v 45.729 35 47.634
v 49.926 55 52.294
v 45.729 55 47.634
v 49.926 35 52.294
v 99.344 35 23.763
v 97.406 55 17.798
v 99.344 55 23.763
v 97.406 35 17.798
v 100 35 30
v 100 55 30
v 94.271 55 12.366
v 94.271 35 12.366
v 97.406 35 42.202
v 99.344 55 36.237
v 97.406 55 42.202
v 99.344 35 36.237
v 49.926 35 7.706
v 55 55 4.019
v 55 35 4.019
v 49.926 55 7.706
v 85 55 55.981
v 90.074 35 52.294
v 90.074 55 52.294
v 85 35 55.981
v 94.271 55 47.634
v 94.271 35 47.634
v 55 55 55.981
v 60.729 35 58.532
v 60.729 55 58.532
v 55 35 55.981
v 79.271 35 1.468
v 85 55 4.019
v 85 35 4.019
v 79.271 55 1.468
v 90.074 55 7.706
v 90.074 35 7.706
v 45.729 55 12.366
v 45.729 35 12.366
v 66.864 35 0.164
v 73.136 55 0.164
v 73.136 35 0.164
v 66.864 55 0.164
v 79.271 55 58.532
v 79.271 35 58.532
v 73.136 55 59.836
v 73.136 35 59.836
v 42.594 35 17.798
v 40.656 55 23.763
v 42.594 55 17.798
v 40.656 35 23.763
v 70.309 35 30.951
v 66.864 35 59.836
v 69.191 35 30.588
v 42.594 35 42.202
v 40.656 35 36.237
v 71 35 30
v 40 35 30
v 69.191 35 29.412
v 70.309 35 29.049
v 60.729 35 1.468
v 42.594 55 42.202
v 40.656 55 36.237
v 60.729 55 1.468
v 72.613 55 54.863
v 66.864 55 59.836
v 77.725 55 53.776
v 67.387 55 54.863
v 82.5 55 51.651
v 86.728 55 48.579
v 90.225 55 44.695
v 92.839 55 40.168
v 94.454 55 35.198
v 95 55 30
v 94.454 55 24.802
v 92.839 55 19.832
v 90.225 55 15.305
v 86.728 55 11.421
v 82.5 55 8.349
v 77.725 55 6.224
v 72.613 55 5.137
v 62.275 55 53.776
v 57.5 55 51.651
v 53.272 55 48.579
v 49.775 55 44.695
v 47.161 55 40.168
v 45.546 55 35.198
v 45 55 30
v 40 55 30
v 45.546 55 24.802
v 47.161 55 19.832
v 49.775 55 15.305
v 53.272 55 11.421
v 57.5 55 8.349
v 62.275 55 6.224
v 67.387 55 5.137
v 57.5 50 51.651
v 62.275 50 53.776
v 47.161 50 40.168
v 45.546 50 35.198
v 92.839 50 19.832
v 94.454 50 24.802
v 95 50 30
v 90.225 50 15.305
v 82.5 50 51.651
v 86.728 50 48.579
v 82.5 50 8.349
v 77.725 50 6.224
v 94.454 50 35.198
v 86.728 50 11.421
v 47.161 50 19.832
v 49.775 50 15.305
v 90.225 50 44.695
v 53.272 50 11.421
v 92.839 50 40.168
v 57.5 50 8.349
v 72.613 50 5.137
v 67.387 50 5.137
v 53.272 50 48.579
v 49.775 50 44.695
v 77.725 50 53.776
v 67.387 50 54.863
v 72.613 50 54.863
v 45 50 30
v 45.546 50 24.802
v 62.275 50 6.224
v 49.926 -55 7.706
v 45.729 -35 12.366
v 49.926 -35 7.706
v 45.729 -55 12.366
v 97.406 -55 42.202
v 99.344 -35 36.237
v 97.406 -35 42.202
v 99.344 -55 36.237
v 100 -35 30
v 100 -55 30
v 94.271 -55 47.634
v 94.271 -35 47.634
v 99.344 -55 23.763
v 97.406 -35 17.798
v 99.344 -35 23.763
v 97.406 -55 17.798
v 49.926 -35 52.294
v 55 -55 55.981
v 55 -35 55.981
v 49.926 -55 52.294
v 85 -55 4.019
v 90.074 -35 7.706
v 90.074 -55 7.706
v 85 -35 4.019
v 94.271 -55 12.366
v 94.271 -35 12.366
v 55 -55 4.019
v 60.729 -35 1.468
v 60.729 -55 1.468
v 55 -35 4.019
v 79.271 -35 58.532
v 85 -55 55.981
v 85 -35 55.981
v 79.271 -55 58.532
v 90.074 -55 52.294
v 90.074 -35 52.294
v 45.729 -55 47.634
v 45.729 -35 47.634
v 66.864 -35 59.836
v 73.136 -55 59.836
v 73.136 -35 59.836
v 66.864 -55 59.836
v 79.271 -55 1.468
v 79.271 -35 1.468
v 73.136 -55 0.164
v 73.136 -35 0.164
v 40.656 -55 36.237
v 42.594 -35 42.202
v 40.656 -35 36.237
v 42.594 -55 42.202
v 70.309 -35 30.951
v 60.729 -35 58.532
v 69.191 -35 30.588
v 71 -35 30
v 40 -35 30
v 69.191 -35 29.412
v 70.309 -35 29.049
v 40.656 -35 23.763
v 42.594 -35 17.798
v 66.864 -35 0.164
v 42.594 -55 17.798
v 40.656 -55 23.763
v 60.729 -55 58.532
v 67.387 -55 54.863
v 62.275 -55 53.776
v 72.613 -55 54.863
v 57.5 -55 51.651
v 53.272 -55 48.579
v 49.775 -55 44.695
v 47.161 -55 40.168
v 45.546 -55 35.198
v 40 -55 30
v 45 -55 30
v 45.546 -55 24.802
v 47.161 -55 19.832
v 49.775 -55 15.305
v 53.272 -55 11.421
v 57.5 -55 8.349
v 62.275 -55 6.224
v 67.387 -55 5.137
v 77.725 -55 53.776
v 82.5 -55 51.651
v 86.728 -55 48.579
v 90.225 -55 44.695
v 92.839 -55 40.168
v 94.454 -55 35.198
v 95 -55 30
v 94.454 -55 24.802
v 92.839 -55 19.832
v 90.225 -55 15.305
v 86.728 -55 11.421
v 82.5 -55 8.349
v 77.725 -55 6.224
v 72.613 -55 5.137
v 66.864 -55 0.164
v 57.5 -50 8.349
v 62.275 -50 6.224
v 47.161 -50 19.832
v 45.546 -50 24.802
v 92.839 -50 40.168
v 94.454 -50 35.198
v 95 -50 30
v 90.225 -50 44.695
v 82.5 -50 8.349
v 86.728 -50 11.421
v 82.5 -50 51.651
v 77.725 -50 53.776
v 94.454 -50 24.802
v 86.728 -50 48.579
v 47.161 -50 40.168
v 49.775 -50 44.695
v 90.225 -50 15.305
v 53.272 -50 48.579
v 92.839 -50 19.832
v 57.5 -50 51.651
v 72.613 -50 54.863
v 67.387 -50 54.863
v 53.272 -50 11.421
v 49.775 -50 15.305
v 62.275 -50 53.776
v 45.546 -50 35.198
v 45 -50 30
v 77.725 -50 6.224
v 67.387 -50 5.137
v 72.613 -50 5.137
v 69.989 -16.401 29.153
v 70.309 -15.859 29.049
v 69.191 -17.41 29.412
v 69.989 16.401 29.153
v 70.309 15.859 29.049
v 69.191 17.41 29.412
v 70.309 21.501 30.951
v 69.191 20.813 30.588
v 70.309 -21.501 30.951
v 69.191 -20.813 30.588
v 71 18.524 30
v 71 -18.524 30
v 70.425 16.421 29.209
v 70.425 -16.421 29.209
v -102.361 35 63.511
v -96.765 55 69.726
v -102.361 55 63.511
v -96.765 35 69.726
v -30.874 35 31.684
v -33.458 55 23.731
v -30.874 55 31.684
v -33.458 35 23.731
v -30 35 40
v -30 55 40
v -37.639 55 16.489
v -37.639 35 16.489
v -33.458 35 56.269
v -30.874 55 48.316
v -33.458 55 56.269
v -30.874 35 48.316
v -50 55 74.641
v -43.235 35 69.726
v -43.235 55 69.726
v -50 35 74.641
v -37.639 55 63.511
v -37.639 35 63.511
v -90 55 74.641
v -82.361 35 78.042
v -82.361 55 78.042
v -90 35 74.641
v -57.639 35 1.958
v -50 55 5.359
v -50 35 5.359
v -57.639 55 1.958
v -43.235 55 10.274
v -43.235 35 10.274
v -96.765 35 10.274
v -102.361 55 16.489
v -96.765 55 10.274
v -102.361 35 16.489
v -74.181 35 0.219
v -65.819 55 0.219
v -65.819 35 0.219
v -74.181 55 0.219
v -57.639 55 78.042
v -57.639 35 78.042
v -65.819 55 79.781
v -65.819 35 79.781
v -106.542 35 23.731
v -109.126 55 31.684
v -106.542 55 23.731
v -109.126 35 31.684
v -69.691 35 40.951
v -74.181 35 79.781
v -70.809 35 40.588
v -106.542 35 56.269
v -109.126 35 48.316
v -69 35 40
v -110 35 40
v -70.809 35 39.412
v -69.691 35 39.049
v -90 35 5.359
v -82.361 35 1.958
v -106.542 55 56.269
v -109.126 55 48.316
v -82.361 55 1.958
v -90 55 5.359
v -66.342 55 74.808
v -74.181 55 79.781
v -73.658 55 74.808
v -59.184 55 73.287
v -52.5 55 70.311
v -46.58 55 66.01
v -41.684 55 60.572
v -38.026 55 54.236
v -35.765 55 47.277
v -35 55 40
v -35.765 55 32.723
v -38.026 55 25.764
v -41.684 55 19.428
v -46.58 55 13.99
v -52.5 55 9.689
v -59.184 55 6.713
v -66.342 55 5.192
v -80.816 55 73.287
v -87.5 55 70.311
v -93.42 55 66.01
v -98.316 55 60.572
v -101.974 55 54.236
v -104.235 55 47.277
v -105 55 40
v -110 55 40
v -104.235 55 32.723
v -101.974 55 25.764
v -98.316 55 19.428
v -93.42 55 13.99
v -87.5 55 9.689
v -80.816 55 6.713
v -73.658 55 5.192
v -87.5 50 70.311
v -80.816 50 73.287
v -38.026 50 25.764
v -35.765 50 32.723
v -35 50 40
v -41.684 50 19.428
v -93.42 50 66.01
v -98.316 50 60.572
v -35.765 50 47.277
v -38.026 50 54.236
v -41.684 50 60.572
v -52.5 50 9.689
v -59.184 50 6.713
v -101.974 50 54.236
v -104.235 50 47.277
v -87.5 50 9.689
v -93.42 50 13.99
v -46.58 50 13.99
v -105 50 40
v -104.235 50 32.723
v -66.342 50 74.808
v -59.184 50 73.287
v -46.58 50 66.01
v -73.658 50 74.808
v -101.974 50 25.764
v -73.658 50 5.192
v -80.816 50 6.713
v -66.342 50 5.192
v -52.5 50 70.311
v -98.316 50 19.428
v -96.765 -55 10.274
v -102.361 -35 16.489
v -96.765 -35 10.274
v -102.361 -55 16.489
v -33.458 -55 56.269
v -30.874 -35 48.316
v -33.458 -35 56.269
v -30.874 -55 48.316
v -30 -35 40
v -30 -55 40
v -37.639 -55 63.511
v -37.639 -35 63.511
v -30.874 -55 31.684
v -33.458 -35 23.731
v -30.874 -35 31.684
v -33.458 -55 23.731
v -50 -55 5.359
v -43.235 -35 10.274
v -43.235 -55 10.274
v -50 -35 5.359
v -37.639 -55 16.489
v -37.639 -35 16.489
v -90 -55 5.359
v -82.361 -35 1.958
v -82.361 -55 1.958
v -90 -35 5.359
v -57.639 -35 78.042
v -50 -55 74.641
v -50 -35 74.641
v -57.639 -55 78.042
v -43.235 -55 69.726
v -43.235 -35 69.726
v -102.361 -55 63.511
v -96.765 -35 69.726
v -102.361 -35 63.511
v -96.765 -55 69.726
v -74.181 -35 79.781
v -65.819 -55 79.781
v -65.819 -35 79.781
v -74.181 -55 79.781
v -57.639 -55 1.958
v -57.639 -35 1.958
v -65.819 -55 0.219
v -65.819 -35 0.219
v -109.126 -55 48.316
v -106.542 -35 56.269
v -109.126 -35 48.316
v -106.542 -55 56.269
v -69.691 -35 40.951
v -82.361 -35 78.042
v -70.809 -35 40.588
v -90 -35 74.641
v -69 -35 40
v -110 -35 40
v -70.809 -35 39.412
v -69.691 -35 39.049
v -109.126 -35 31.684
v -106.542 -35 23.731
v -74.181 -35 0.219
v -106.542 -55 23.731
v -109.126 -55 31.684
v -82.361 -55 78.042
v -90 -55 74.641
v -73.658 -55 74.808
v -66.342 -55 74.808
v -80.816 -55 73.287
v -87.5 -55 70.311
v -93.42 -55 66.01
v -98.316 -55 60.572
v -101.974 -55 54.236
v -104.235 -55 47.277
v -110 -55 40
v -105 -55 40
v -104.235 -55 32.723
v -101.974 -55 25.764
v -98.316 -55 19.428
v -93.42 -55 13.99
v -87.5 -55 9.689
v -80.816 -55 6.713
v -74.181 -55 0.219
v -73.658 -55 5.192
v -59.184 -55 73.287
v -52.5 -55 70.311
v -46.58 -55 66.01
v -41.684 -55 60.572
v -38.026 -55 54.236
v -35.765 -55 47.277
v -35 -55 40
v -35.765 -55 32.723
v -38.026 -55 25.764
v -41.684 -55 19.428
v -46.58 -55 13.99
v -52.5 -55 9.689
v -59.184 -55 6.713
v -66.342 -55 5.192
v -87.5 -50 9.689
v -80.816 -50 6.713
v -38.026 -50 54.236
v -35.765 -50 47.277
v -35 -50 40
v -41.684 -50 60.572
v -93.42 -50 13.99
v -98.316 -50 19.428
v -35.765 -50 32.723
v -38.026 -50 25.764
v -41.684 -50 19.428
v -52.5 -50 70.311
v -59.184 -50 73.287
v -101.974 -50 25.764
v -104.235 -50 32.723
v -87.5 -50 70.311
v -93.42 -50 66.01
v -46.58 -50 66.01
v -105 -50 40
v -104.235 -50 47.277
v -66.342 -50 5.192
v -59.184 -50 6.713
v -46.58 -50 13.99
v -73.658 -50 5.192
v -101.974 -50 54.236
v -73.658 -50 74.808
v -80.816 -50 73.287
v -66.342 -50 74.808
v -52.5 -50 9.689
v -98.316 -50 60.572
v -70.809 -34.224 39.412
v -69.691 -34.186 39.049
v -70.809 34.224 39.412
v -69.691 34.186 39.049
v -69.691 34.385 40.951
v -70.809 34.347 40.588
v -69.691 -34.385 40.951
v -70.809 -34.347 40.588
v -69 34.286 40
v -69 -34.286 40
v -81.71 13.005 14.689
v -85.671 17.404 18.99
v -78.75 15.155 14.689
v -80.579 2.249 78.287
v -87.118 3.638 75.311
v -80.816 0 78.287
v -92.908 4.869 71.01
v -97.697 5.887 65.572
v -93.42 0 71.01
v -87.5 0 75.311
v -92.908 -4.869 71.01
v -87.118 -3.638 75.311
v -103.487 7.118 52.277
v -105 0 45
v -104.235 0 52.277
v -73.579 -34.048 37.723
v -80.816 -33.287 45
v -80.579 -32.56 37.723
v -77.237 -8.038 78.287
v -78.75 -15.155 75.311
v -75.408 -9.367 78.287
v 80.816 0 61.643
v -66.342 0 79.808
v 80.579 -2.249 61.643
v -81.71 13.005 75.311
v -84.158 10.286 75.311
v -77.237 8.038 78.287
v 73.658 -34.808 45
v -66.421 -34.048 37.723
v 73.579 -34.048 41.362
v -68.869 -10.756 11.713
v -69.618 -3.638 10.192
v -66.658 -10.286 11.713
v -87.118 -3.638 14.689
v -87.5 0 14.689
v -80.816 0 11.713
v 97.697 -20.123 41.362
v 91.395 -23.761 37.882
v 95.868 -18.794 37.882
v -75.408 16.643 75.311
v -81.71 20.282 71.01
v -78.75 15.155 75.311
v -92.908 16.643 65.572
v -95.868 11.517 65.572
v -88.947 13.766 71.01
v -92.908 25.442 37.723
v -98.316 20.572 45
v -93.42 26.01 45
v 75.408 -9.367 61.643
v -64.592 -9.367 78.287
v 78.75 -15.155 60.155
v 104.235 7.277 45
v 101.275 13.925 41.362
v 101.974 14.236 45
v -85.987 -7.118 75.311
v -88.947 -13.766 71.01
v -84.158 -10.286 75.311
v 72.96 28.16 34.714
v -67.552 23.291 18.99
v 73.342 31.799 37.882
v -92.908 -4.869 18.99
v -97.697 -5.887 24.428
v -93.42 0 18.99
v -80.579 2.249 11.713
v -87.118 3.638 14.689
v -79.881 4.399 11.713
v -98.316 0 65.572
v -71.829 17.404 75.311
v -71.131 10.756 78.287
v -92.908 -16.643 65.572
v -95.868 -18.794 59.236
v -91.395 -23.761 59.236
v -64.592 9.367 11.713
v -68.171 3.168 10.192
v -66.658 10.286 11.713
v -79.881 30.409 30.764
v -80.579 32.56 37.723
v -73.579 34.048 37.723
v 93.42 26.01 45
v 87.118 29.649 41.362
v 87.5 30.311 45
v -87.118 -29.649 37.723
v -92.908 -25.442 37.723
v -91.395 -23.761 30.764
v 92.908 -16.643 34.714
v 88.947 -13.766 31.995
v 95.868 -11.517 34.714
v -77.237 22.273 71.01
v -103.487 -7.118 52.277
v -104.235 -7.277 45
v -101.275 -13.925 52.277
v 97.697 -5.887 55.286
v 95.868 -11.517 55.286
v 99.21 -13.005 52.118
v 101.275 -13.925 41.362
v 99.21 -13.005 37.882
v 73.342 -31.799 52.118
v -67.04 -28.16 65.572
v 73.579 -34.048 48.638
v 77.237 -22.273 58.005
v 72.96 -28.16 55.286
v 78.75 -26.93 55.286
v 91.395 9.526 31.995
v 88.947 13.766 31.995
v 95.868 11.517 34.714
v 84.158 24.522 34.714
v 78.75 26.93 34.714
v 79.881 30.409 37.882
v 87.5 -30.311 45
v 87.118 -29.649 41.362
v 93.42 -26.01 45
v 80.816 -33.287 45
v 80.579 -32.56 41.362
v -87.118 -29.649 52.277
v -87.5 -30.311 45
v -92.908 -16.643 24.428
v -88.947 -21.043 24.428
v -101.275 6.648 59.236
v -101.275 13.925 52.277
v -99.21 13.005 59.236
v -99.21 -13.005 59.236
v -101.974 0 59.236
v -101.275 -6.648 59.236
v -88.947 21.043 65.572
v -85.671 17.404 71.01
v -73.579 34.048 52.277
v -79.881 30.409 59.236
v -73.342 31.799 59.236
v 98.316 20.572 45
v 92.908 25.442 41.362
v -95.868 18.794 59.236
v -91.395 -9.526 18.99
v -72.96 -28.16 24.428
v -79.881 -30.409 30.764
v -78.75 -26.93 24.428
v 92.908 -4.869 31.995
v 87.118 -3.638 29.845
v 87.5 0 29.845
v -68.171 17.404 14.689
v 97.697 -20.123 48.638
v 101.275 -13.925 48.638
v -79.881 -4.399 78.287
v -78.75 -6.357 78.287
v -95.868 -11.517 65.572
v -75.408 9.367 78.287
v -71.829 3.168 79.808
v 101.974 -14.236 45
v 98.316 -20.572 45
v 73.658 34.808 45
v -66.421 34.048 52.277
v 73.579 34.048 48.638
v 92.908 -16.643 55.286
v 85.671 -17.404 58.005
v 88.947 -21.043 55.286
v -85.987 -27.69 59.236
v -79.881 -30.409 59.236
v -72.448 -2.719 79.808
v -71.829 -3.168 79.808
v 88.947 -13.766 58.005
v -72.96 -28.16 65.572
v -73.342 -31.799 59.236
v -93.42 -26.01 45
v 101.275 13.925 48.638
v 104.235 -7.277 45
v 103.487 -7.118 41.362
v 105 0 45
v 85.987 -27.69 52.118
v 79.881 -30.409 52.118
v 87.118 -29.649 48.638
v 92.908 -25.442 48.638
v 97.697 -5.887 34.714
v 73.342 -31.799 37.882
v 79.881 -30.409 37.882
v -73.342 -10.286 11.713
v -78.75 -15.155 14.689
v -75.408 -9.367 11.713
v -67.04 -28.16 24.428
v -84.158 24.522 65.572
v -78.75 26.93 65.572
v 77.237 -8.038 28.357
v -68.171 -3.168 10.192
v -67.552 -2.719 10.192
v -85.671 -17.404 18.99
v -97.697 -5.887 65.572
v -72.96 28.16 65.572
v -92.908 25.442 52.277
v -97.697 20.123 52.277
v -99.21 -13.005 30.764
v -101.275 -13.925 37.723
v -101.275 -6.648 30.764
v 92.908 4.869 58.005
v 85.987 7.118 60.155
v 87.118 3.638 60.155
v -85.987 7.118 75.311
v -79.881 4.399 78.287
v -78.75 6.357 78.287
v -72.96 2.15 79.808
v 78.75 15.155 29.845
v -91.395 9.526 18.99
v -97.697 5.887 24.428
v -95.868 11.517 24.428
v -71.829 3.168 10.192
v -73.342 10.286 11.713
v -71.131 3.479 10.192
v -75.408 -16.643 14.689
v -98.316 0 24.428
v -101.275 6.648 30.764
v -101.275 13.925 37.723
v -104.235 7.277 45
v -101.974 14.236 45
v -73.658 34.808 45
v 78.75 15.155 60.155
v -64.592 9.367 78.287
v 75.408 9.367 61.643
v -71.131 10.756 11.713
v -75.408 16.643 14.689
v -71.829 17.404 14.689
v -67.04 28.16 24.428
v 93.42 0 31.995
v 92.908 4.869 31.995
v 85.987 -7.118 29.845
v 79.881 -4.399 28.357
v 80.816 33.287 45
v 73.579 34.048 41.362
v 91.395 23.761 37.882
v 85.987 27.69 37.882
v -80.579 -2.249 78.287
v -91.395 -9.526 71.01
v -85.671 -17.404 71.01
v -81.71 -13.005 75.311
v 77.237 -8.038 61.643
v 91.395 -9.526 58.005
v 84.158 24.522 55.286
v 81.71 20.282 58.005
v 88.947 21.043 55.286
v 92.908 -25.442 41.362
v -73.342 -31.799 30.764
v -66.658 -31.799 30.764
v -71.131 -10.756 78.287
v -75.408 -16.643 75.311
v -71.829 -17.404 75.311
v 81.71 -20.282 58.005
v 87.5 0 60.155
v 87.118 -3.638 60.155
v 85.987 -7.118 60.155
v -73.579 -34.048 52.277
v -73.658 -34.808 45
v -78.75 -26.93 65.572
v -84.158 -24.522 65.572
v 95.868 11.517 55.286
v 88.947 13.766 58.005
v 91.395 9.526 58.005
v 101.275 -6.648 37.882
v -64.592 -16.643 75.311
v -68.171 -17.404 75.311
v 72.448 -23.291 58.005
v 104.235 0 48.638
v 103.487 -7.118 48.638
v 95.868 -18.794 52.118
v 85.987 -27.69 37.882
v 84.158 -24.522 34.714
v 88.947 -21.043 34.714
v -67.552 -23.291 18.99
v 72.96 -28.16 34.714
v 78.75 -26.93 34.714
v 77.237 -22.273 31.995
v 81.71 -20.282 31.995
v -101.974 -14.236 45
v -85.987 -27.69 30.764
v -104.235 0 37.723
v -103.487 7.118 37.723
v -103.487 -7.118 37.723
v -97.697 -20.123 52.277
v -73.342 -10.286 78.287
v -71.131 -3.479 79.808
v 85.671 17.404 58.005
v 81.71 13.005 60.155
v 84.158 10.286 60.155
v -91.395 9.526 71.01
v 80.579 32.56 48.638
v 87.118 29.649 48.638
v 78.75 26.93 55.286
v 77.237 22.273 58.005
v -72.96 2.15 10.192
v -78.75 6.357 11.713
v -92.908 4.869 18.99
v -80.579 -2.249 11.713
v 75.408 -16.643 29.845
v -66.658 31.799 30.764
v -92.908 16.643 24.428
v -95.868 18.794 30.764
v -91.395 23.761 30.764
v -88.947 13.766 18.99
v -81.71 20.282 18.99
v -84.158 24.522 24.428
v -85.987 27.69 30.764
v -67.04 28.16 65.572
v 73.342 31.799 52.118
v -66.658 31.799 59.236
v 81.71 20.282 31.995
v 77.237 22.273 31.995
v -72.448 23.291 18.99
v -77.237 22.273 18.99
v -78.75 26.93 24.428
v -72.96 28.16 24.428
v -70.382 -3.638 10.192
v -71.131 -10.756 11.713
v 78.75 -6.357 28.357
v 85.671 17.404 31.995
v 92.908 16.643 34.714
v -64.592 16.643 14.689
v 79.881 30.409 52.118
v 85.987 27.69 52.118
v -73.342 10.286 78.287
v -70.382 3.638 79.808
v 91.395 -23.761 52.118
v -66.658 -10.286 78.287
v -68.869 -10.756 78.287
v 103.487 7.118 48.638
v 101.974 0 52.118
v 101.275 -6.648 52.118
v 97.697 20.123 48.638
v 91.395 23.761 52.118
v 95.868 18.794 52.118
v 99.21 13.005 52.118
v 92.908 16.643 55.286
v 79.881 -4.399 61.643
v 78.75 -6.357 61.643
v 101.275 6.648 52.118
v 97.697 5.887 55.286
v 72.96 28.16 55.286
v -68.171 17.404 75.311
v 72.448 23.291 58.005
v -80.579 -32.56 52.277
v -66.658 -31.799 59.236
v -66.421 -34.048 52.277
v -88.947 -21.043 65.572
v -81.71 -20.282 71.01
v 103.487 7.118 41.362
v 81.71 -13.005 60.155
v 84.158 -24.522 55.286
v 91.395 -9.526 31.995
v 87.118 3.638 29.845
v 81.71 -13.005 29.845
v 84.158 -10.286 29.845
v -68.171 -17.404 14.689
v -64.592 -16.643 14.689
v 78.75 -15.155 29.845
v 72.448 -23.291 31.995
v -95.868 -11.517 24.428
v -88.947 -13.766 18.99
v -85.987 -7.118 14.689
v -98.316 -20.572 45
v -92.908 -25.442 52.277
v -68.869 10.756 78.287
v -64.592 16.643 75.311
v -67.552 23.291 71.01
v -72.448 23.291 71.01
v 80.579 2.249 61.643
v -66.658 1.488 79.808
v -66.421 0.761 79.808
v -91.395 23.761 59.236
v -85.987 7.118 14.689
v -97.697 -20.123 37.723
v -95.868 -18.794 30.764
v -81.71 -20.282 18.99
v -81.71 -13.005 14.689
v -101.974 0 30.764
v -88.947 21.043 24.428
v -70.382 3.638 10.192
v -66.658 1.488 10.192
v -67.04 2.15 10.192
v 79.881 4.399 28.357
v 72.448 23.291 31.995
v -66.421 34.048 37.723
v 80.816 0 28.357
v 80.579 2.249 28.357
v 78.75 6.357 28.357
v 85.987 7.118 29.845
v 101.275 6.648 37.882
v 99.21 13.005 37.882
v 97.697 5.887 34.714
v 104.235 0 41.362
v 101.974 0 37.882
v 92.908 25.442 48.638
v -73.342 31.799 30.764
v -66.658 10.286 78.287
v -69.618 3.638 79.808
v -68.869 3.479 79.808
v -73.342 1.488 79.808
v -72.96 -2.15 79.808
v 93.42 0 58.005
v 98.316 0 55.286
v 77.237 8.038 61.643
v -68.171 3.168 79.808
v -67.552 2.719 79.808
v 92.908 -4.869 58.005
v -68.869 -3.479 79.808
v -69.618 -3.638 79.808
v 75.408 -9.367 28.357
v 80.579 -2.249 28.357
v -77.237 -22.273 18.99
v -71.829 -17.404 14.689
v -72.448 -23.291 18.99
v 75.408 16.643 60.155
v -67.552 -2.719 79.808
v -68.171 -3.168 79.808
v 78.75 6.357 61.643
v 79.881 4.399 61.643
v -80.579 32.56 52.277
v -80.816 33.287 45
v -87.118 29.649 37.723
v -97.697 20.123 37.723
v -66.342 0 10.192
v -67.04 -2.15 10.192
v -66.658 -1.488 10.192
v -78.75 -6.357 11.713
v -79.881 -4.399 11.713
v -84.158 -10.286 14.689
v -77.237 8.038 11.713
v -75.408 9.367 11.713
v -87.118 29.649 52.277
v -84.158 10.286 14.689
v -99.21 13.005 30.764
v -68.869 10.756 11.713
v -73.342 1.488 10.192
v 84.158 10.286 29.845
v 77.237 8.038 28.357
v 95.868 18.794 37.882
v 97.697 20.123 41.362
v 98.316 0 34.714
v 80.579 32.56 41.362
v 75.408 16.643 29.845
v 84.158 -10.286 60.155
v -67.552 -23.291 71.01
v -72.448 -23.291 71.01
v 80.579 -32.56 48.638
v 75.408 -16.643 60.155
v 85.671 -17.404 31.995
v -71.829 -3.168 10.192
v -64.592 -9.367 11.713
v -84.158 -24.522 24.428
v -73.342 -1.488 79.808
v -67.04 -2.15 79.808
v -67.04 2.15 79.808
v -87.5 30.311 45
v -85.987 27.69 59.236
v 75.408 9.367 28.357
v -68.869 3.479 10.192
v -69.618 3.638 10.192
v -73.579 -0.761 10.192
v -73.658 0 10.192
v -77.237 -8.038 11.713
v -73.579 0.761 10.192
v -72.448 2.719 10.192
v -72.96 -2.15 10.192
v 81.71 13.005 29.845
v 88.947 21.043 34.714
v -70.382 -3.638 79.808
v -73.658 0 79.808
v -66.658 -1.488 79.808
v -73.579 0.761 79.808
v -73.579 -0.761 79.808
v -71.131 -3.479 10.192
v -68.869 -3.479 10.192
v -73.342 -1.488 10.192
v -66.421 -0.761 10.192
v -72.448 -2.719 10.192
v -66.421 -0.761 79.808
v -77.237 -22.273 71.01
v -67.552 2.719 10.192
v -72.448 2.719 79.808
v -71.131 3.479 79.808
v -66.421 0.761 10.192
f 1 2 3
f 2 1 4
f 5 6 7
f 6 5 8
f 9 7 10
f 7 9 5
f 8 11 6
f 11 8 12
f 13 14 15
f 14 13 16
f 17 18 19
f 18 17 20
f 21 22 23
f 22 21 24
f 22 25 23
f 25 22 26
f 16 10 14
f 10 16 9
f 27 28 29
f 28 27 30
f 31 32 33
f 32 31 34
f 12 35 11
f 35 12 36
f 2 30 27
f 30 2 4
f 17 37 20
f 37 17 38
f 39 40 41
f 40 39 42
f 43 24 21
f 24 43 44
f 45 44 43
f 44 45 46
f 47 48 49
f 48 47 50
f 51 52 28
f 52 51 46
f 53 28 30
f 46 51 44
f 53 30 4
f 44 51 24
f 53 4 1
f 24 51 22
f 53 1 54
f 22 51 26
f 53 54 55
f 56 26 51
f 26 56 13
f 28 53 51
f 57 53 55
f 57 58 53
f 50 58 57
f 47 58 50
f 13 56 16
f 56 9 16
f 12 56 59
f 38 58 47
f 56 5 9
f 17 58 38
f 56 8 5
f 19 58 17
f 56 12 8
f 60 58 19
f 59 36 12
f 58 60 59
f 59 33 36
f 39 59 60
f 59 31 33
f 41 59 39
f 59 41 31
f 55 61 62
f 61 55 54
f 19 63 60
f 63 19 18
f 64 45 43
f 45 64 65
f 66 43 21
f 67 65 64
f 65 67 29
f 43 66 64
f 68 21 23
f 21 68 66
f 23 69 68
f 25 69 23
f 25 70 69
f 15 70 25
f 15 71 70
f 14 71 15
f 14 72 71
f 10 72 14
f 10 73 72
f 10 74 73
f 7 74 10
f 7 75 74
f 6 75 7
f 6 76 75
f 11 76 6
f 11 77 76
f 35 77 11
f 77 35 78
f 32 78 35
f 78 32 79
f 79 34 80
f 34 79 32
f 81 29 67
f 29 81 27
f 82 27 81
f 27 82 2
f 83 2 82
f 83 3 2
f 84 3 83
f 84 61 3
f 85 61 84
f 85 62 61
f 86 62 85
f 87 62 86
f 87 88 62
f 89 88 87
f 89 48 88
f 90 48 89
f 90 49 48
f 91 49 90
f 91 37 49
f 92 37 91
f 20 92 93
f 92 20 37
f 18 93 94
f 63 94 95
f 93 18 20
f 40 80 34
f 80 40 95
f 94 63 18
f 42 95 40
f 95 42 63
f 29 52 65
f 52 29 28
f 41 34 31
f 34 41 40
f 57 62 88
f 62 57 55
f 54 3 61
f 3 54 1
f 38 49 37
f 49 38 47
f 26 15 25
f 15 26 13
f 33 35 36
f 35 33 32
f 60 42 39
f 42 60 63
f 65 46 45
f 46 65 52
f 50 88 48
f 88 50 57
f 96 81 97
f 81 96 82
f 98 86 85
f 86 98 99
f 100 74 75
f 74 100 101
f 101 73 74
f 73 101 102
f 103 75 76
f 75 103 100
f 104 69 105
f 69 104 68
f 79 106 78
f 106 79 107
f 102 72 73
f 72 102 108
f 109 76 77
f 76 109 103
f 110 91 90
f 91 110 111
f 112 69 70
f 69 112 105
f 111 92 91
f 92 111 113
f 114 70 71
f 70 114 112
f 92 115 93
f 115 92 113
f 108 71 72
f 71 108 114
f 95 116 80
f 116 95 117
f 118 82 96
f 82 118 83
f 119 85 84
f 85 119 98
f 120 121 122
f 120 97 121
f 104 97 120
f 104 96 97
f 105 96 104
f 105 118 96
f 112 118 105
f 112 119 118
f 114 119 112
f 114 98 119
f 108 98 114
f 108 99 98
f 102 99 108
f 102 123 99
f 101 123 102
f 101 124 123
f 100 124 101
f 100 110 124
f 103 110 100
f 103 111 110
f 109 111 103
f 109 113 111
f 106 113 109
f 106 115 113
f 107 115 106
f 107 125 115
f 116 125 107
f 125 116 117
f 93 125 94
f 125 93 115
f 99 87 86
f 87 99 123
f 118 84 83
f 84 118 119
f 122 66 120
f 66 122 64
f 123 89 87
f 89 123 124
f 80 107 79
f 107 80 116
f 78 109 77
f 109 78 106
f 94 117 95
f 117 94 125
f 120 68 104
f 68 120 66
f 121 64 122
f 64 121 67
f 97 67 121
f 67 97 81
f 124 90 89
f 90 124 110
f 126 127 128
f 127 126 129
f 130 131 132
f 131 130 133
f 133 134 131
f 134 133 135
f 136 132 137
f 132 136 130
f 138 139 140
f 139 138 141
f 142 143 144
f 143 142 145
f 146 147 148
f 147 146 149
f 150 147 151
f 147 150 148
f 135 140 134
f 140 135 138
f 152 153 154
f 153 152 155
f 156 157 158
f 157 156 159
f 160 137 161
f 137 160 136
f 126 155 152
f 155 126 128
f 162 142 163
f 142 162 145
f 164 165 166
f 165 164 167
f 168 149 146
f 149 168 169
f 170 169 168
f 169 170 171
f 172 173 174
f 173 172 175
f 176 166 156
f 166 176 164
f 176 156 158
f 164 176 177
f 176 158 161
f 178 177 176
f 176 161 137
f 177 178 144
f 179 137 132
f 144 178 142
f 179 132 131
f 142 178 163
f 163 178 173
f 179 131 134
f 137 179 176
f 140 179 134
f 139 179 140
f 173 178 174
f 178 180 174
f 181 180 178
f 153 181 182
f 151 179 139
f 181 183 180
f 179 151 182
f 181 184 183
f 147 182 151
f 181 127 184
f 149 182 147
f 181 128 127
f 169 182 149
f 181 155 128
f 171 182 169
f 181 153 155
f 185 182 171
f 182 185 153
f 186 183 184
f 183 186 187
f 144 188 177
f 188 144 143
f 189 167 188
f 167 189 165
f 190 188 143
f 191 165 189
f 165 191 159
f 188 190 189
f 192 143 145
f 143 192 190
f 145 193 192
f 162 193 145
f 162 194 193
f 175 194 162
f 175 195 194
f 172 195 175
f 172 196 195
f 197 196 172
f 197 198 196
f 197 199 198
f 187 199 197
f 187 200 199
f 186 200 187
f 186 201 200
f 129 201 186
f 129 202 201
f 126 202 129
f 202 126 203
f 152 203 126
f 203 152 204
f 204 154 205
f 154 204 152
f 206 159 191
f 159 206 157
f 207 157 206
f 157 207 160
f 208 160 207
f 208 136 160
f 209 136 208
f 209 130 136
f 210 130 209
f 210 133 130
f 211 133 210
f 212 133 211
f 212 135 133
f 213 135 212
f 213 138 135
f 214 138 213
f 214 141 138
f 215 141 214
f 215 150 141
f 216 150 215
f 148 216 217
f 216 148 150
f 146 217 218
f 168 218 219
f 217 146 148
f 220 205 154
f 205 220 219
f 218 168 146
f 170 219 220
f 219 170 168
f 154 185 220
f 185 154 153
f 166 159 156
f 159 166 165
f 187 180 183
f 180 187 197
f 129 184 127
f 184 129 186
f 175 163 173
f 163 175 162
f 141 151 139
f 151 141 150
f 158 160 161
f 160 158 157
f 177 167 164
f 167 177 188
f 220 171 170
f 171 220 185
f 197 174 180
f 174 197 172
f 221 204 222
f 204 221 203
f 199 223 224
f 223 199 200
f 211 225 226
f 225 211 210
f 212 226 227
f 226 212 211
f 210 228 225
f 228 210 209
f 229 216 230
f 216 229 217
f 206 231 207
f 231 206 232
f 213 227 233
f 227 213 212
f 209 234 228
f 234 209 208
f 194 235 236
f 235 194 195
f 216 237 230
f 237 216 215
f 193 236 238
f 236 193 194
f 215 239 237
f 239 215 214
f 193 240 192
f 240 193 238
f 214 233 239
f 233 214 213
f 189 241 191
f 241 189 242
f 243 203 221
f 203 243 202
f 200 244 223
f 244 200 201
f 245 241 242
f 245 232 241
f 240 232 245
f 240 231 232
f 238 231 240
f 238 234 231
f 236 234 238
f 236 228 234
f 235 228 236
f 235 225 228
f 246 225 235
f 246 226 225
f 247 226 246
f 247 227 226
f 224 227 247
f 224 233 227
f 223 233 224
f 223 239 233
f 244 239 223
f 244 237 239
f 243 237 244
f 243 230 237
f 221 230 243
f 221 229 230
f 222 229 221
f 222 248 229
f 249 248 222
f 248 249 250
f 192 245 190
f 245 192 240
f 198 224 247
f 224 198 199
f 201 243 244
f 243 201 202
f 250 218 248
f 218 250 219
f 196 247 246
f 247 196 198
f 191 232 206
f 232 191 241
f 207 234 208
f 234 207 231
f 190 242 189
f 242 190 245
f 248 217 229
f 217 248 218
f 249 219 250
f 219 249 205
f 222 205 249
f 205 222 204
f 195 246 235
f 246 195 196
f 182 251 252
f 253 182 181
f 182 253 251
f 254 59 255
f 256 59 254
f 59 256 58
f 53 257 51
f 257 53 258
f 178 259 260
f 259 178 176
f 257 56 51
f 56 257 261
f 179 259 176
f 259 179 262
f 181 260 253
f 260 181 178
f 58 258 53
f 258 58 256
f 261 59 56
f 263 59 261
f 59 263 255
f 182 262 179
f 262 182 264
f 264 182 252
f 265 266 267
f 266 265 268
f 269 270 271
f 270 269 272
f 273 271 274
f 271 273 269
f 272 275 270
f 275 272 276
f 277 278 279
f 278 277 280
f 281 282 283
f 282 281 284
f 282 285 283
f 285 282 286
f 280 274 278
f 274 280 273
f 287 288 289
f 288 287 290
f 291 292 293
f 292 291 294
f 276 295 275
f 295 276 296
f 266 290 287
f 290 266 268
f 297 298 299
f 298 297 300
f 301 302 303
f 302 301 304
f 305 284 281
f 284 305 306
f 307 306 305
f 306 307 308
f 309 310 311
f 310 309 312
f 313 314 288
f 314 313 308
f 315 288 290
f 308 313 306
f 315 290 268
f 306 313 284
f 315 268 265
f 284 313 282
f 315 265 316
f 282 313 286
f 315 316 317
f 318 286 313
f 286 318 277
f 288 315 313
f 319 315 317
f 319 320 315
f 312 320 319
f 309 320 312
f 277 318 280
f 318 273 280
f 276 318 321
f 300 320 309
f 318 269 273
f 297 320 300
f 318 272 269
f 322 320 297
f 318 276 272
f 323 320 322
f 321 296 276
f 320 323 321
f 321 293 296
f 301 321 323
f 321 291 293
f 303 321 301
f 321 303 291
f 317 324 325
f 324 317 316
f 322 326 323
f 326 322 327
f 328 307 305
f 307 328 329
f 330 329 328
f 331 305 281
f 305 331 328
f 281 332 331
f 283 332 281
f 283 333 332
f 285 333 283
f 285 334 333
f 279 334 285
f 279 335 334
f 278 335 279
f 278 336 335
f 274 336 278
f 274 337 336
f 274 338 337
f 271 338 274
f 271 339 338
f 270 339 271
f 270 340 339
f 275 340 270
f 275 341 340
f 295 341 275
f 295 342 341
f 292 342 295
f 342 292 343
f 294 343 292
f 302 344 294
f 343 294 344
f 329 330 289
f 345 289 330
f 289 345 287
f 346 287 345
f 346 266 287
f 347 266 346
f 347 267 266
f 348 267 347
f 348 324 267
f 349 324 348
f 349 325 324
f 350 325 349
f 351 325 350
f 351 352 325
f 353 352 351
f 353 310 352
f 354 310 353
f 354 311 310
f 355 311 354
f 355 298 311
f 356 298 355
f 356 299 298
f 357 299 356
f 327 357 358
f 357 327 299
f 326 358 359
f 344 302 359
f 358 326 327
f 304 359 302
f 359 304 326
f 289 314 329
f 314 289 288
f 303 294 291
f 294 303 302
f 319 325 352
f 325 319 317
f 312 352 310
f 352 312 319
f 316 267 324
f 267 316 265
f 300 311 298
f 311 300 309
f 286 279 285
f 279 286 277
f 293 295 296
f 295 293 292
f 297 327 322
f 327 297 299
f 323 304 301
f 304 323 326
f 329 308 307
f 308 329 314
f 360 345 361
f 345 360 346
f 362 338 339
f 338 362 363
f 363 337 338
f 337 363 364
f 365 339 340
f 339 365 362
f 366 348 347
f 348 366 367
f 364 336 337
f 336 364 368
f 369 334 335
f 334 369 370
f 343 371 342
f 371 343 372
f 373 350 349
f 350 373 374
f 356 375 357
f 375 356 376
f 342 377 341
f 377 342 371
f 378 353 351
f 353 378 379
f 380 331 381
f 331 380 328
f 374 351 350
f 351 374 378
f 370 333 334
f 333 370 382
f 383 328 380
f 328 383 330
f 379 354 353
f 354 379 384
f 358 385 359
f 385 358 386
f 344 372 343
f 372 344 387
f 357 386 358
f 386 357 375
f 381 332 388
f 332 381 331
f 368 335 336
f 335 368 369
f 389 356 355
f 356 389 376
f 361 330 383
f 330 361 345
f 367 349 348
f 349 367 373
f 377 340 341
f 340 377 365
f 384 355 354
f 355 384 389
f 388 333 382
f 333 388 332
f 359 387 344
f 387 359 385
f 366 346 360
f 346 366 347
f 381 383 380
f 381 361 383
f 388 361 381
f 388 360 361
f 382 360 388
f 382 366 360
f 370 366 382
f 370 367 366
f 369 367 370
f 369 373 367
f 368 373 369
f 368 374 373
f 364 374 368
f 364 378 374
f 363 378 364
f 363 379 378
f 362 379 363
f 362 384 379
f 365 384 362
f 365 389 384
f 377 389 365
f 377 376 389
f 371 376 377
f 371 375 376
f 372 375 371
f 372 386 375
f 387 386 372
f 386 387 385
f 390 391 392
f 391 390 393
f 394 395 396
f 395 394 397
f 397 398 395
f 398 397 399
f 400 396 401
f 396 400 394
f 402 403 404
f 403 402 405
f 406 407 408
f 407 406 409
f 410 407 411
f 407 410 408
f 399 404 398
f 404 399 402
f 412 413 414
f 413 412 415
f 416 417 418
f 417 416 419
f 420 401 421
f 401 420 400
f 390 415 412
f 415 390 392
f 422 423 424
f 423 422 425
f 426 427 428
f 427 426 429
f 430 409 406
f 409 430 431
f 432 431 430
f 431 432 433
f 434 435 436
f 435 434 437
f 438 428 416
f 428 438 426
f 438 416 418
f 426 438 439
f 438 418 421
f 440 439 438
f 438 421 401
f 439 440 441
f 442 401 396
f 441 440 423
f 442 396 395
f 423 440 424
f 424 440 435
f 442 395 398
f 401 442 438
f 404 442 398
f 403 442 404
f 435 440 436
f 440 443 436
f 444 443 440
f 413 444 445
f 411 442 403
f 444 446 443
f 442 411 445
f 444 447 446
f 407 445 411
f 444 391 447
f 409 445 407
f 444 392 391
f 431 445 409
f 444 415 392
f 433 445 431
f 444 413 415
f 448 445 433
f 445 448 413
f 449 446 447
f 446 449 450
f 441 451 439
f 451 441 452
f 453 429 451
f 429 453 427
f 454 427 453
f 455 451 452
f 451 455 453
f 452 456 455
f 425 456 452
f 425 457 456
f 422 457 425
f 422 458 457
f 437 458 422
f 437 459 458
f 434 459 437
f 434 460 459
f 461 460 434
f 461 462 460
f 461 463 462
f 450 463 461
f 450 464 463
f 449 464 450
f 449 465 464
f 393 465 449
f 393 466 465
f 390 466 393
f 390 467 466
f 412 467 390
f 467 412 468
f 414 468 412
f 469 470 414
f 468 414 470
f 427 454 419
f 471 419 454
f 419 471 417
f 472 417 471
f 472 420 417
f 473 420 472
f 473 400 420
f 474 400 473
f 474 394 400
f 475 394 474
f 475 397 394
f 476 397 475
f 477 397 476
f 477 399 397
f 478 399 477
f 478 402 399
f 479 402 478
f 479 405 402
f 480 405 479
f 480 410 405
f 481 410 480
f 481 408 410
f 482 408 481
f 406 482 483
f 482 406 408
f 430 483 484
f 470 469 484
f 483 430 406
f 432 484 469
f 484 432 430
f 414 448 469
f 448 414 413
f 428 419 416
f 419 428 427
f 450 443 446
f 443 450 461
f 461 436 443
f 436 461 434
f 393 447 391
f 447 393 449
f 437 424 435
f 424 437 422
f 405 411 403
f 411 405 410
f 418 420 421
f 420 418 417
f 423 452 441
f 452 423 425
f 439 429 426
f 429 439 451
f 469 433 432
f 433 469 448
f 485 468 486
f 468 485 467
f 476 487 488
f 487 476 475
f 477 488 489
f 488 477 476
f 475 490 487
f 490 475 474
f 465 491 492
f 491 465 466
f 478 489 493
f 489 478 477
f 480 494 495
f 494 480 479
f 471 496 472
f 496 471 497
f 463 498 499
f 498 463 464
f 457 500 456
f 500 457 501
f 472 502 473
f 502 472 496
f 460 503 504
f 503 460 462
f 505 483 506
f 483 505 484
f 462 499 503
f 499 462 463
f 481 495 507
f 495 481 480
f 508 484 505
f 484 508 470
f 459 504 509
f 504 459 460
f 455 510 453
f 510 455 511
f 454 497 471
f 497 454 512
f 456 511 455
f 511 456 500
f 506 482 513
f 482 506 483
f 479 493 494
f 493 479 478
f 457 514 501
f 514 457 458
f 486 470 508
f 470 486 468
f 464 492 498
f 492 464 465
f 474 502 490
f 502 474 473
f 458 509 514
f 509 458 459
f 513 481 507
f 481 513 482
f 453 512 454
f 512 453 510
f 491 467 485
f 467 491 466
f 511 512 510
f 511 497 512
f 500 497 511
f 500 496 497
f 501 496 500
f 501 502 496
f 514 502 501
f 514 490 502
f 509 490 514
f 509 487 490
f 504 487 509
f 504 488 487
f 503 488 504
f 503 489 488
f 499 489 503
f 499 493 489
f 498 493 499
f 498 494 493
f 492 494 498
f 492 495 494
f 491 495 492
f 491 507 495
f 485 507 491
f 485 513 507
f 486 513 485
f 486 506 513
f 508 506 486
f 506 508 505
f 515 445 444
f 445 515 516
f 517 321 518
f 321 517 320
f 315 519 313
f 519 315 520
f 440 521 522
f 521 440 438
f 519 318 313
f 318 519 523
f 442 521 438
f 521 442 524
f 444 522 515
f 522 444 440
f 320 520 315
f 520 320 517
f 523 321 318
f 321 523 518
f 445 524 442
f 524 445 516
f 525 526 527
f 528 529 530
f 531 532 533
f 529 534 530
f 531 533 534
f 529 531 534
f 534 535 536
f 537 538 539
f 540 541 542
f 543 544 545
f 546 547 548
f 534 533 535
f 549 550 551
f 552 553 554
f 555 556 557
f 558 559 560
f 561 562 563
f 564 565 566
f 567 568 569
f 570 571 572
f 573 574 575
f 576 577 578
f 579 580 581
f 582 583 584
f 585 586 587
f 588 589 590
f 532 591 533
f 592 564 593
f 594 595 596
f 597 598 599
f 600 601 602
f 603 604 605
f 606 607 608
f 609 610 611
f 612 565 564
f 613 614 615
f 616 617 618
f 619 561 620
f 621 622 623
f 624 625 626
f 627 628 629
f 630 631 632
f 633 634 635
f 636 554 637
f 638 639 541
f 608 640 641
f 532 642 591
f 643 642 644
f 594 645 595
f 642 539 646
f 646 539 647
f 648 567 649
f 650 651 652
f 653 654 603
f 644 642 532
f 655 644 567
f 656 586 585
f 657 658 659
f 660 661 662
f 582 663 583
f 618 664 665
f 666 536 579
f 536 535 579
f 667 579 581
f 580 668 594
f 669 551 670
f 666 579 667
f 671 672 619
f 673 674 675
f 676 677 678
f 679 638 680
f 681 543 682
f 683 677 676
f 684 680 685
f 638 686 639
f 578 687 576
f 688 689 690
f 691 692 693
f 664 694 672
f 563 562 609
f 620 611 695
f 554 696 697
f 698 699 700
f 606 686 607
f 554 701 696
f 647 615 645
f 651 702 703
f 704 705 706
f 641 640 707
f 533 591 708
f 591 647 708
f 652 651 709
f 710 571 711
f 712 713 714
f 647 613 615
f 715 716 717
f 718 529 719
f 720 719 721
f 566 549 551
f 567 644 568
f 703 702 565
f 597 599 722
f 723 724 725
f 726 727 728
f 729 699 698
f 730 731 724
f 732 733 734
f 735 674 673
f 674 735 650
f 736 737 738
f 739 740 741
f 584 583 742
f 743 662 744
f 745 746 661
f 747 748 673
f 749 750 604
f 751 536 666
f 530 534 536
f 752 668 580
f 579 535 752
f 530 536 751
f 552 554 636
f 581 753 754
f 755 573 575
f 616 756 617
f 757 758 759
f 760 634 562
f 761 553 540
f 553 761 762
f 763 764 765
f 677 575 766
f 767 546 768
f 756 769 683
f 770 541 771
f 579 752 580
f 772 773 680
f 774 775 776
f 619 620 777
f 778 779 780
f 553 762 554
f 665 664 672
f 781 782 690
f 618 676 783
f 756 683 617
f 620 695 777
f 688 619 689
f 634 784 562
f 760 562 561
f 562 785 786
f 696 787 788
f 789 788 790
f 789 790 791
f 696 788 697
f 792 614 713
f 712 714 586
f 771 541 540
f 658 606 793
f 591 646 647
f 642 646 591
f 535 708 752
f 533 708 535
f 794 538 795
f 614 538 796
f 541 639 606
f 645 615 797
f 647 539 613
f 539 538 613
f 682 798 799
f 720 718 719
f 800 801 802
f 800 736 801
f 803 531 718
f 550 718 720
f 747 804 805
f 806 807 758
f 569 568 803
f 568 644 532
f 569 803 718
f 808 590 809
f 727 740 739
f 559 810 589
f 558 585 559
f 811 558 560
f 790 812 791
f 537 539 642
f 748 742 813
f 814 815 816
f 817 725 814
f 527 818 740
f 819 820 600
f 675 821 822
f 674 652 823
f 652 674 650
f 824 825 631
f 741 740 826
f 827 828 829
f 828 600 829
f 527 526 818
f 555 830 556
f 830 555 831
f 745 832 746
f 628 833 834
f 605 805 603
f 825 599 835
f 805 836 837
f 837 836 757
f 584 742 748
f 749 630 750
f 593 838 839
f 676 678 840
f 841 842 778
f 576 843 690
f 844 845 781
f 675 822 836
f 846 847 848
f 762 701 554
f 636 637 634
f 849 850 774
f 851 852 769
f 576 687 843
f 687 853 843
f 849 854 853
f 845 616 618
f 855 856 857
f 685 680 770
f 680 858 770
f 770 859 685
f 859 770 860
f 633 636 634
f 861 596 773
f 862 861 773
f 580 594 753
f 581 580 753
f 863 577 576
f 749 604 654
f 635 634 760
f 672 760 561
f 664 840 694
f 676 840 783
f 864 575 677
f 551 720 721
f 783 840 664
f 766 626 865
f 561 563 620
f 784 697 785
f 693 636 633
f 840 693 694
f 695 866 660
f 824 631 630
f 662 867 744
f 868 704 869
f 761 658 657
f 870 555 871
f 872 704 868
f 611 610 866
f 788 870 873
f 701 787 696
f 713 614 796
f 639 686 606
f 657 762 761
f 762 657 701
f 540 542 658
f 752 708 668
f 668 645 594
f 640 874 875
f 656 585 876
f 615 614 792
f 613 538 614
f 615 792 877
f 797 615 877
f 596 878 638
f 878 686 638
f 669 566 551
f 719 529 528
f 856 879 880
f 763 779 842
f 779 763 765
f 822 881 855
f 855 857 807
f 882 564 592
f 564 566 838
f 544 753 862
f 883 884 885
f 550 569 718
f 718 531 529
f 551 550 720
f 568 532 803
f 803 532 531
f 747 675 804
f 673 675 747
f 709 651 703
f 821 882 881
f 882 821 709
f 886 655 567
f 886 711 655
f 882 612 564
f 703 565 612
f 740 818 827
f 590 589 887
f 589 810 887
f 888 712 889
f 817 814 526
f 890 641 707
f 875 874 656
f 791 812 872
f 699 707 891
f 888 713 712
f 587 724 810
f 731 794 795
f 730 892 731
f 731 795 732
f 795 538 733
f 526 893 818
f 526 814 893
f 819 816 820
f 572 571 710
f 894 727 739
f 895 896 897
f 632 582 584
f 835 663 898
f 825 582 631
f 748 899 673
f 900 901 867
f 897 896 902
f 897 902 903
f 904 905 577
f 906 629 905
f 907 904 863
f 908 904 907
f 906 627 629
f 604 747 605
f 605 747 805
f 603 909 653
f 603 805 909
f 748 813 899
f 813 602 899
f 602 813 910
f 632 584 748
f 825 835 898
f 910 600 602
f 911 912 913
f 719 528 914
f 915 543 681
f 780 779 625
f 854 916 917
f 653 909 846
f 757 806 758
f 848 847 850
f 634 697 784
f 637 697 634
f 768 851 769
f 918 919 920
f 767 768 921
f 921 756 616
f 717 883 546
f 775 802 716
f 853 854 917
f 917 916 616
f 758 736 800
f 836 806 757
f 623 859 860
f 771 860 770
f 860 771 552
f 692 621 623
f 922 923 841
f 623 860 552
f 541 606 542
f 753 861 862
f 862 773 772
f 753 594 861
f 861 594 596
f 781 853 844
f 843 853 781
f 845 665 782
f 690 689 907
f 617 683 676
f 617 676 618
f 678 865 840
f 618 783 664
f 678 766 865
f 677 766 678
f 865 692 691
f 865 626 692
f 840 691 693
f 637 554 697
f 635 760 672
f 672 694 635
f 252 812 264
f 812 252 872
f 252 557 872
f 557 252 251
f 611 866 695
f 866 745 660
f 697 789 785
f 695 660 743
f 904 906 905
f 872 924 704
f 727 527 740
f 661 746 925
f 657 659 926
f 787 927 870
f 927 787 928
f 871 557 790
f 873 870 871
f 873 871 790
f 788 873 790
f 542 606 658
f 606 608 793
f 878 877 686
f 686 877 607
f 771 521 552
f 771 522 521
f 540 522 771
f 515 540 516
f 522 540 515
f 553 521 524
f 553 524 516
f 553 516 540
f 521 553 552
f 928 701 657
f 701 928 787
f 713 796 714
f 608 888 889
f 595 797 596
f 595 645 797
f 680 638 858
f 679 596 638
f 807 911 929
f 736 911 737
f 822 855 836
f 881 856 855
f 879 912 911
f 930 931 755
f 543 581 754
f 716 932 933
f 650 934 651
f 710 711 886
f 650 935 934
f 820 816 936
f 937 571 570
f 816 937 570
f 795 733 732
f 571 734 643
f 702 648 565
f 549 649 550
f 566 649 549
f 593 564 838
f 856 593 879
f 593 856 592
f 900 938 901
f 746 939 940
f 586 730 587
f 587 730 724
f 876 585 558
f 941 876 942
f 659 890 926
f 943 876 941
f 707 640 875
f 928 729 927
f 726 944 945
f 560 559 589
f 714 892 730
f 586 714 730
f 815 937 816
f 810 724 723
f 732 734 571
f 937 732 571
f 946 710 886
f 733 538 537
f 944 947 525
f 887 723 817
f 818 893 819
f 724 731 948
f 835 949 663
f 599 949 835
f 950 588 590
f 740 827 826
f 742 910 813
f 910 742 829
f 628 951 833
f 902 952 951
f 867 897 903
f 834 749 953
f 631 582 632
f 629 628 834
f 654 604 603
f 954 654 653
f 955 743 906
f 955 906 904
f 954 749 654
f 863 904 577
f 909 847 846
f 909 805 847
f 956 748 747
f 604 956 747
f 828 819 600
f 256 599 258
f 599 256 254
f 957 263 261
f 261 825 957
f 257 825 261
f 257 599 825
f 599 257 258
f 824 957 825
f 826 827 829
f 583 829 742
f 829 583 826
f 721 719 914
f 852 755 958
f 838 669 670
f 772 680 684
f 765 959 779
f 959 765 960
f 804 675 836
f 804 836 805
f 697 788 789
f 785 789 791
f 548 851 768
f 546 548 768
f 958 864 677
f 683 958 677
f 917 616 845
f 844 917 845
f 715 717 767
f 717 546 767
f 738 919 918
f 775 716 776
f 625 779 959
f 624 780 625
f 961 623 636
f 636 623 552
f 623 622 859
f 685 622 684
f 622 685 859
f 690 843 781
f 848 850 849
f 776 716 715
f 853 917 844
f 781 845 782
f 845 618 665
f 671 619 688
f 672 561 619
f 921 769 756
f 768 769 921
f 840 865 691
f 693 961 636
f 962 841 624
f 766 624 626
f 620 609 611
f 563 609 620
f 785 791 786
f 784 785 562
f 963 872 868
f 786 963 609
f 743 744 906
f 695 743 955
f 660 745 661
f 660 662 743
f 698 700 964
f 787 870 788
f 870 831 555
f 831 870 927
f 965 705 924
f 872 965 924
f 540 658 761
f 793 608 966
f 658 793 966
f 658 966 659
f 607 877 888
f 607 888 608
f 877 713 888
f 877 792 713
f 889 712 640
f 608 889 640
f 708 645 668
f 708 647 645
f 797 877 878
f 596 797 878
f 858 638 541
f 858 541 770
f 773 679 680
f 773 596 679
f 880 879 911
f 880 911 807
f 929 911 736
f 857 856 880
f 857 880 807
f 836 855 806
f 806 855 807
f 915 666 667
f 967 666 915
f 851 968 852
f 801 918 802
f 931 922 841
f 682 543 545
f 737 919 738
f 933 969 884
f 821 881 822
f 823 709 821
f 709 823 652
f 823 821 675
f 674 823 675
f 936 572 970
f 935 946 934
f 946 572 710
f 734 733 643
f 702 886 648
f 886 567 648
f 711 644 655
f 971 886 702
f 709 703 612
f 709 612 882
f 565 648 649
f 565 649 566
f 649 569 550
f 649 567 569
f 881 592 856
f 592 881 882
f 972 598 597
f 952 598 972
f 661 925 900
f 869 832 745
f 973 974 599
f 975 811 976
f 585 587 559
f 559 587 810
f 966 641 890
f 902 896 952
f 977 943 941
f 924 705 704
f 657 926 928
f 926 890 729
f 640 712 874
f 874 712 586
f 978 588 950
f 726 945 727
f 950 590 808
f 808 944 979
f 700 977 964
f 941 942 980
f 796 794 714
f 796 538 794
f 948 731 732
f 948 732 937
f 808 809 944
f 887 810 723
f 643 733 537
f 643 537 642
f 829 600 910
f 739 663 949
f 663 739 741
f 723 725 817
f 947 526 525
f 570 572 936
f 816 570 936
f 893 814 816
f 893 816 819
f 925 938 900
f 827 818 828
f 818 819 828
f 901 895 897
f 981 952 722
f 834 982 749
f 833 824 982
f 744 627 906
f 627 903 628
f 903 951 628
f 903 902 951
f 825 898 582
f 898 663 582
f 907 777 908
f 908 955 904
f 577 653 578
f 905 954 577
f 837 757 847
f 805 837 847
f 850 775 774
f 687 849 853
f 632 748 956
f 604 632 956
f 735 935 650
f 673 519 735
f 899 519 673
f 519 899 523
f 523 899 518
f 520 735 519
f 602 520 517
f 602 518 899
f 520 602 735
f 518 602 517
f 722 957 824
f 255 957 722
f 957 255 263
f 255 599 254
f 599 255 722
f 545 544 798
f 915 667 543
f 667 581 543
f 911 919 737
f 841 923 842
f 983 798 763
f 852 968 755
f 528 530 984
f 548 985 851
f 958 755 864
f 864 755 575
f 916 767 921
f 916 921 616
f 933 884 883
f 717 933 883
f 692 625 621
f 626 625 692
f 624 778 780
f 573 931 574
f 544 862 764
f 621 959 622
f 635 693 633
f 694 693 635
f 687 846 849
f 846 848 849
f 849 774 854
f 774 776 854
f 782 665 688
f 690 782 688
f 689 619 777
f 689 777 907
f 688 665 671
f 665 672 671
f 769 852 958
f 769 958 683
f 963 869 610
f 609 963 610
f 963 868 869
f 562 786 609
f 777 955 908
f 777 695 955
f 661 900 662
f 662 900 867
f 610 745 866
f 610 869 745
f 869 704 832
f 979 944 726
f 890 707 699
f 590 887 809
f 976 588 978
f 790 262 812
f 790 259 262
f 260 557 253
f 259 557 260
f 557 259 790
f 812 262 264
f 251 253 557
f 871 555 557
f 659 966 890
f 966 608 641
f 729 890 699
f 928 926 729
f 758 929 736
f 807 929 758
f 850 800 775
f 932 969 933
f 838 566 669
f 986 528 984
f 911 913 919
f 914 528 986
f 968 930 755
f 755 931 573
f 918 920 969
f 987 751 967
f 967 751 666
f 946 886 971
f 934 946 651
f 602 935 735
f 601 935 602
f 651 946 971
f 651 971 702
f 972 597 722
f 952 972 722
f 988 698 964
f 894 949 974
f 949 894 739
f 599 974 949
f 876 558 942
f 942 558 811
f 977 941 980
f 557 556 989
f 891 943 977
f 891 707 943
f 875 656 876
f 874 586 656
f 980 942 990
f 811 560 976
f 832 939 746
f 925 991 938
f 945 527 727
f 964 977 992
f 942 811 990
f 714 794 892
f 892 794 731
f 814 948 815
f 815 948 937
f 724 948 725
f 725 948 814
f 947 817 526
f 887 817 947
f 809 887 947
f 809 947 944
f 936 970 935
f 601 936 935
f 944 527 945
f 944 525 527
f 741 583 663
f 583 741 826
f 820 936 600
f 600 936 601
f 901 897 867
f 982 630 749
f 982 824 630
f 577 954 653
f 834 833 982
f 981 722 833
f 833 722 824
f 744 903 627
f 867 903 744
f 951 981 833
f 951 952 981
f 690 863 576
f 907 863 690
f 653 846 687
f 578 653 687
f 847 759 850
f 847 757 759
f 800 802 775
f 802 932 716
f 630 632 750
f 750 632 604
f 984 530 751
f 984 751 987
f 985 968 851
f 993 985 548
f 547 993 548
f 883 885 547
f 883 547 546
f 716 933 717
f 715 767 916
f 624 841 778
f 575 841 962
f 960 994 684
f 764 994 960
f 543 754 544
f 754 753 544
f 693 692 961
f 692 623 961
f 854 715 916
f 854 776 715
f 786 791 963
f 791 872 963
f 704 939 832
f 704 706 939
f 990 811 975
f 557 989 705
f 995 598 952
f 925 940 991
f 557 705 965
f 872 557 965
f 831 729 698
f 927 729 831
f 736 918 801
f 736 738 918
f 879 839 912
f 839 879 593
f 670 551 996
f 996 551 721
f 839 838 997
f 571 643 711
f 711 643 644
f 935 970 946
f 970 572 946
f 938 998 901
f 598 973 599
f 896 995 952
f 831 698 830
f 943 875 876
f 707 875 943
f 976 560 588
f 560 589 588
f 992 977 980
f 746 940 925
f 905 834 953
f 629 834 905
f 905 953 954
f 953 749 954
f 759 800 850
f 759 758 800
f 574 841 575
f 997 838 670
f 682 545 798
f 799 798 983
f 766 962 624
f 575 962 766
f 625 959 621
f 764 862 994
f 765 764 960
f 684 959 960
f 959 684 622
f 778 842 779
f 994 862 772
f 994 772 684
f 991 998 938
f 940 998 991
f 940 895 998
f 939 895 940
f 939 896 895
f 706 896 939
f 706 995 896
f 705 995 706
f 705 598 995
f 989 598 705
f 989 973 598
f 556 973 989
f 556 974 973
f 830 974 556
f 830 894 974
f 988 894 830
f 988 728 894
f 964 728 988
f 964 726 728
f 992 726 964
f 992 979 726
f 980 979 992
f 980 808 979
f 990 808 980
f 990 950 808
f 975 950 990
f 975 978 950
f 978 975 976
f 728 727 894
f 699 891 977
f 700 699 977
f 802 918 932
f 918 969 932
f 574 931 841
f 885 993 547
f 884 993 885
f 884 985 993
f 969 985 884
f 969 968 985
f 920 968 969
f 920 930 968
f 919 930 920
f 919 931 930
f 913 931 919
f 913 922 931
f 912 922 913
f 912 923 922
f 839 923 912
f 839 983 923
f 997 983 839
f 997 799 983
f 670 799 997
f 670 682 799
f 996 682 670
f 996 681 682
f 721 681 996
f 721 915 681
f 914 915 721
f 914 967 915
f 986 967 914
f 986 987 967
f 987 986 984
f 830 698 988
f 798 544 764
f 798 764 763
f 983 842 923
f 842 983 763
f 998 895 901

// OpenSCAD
front_wheel_radius = 30;
back_wheel_radius = 40;
wheel_width = 20;

axe_spacing = 2*(front_wheel_radius+back_wheel_radius);
wheel_spacing = axe_spacing/2;

car_length = axe_spacing + front_wheel_radius+back_wheel_radius + 20;

module wheel(radius, width)
{
	difference()
	{
		cylinder(h=width,r=radius);
		translate([0,0,width-5])
			cylinder(h=width,r=radius-5);
	}
}

module front_wheel()
{
	wheel(front_wheel_radius, wheel_width);
}

module back_wheel()
{
	wheel(back_wheel_radius, wheel_width);
}

module wheel_pair(spacing)
{
	// axe
	rotate([90,0,0]) cylinder(h=spacing,r=1,center=true);
	// left wheel
	translate([0,spacing/2,0]) rotate([-90,0,0]) child();
	// right wheel
	translate([0,-spacing/2,0]) rotate([90,0,0]) child();
}

// car body
translate([-axe_spacing/2,0,wheel_spacing/2+front_wheel_radius/3])
	hull()
	{
		sphere(wheel_spacing/2);
		translate([axe_spacing,0,0]) scale([1,1,1/2]) sphere(wheel_spacing/2);
	}

// front wheels + axe
translate([axe_spacing/2,0,front_wheel_radius]) wheel_pair(wheel_spacing) front_wheel();
// back wheels + axe
translate([-axe_spacing/2,0,back_wheel_radius]) wheel_pair(wheel_spacing) back_wheel();
